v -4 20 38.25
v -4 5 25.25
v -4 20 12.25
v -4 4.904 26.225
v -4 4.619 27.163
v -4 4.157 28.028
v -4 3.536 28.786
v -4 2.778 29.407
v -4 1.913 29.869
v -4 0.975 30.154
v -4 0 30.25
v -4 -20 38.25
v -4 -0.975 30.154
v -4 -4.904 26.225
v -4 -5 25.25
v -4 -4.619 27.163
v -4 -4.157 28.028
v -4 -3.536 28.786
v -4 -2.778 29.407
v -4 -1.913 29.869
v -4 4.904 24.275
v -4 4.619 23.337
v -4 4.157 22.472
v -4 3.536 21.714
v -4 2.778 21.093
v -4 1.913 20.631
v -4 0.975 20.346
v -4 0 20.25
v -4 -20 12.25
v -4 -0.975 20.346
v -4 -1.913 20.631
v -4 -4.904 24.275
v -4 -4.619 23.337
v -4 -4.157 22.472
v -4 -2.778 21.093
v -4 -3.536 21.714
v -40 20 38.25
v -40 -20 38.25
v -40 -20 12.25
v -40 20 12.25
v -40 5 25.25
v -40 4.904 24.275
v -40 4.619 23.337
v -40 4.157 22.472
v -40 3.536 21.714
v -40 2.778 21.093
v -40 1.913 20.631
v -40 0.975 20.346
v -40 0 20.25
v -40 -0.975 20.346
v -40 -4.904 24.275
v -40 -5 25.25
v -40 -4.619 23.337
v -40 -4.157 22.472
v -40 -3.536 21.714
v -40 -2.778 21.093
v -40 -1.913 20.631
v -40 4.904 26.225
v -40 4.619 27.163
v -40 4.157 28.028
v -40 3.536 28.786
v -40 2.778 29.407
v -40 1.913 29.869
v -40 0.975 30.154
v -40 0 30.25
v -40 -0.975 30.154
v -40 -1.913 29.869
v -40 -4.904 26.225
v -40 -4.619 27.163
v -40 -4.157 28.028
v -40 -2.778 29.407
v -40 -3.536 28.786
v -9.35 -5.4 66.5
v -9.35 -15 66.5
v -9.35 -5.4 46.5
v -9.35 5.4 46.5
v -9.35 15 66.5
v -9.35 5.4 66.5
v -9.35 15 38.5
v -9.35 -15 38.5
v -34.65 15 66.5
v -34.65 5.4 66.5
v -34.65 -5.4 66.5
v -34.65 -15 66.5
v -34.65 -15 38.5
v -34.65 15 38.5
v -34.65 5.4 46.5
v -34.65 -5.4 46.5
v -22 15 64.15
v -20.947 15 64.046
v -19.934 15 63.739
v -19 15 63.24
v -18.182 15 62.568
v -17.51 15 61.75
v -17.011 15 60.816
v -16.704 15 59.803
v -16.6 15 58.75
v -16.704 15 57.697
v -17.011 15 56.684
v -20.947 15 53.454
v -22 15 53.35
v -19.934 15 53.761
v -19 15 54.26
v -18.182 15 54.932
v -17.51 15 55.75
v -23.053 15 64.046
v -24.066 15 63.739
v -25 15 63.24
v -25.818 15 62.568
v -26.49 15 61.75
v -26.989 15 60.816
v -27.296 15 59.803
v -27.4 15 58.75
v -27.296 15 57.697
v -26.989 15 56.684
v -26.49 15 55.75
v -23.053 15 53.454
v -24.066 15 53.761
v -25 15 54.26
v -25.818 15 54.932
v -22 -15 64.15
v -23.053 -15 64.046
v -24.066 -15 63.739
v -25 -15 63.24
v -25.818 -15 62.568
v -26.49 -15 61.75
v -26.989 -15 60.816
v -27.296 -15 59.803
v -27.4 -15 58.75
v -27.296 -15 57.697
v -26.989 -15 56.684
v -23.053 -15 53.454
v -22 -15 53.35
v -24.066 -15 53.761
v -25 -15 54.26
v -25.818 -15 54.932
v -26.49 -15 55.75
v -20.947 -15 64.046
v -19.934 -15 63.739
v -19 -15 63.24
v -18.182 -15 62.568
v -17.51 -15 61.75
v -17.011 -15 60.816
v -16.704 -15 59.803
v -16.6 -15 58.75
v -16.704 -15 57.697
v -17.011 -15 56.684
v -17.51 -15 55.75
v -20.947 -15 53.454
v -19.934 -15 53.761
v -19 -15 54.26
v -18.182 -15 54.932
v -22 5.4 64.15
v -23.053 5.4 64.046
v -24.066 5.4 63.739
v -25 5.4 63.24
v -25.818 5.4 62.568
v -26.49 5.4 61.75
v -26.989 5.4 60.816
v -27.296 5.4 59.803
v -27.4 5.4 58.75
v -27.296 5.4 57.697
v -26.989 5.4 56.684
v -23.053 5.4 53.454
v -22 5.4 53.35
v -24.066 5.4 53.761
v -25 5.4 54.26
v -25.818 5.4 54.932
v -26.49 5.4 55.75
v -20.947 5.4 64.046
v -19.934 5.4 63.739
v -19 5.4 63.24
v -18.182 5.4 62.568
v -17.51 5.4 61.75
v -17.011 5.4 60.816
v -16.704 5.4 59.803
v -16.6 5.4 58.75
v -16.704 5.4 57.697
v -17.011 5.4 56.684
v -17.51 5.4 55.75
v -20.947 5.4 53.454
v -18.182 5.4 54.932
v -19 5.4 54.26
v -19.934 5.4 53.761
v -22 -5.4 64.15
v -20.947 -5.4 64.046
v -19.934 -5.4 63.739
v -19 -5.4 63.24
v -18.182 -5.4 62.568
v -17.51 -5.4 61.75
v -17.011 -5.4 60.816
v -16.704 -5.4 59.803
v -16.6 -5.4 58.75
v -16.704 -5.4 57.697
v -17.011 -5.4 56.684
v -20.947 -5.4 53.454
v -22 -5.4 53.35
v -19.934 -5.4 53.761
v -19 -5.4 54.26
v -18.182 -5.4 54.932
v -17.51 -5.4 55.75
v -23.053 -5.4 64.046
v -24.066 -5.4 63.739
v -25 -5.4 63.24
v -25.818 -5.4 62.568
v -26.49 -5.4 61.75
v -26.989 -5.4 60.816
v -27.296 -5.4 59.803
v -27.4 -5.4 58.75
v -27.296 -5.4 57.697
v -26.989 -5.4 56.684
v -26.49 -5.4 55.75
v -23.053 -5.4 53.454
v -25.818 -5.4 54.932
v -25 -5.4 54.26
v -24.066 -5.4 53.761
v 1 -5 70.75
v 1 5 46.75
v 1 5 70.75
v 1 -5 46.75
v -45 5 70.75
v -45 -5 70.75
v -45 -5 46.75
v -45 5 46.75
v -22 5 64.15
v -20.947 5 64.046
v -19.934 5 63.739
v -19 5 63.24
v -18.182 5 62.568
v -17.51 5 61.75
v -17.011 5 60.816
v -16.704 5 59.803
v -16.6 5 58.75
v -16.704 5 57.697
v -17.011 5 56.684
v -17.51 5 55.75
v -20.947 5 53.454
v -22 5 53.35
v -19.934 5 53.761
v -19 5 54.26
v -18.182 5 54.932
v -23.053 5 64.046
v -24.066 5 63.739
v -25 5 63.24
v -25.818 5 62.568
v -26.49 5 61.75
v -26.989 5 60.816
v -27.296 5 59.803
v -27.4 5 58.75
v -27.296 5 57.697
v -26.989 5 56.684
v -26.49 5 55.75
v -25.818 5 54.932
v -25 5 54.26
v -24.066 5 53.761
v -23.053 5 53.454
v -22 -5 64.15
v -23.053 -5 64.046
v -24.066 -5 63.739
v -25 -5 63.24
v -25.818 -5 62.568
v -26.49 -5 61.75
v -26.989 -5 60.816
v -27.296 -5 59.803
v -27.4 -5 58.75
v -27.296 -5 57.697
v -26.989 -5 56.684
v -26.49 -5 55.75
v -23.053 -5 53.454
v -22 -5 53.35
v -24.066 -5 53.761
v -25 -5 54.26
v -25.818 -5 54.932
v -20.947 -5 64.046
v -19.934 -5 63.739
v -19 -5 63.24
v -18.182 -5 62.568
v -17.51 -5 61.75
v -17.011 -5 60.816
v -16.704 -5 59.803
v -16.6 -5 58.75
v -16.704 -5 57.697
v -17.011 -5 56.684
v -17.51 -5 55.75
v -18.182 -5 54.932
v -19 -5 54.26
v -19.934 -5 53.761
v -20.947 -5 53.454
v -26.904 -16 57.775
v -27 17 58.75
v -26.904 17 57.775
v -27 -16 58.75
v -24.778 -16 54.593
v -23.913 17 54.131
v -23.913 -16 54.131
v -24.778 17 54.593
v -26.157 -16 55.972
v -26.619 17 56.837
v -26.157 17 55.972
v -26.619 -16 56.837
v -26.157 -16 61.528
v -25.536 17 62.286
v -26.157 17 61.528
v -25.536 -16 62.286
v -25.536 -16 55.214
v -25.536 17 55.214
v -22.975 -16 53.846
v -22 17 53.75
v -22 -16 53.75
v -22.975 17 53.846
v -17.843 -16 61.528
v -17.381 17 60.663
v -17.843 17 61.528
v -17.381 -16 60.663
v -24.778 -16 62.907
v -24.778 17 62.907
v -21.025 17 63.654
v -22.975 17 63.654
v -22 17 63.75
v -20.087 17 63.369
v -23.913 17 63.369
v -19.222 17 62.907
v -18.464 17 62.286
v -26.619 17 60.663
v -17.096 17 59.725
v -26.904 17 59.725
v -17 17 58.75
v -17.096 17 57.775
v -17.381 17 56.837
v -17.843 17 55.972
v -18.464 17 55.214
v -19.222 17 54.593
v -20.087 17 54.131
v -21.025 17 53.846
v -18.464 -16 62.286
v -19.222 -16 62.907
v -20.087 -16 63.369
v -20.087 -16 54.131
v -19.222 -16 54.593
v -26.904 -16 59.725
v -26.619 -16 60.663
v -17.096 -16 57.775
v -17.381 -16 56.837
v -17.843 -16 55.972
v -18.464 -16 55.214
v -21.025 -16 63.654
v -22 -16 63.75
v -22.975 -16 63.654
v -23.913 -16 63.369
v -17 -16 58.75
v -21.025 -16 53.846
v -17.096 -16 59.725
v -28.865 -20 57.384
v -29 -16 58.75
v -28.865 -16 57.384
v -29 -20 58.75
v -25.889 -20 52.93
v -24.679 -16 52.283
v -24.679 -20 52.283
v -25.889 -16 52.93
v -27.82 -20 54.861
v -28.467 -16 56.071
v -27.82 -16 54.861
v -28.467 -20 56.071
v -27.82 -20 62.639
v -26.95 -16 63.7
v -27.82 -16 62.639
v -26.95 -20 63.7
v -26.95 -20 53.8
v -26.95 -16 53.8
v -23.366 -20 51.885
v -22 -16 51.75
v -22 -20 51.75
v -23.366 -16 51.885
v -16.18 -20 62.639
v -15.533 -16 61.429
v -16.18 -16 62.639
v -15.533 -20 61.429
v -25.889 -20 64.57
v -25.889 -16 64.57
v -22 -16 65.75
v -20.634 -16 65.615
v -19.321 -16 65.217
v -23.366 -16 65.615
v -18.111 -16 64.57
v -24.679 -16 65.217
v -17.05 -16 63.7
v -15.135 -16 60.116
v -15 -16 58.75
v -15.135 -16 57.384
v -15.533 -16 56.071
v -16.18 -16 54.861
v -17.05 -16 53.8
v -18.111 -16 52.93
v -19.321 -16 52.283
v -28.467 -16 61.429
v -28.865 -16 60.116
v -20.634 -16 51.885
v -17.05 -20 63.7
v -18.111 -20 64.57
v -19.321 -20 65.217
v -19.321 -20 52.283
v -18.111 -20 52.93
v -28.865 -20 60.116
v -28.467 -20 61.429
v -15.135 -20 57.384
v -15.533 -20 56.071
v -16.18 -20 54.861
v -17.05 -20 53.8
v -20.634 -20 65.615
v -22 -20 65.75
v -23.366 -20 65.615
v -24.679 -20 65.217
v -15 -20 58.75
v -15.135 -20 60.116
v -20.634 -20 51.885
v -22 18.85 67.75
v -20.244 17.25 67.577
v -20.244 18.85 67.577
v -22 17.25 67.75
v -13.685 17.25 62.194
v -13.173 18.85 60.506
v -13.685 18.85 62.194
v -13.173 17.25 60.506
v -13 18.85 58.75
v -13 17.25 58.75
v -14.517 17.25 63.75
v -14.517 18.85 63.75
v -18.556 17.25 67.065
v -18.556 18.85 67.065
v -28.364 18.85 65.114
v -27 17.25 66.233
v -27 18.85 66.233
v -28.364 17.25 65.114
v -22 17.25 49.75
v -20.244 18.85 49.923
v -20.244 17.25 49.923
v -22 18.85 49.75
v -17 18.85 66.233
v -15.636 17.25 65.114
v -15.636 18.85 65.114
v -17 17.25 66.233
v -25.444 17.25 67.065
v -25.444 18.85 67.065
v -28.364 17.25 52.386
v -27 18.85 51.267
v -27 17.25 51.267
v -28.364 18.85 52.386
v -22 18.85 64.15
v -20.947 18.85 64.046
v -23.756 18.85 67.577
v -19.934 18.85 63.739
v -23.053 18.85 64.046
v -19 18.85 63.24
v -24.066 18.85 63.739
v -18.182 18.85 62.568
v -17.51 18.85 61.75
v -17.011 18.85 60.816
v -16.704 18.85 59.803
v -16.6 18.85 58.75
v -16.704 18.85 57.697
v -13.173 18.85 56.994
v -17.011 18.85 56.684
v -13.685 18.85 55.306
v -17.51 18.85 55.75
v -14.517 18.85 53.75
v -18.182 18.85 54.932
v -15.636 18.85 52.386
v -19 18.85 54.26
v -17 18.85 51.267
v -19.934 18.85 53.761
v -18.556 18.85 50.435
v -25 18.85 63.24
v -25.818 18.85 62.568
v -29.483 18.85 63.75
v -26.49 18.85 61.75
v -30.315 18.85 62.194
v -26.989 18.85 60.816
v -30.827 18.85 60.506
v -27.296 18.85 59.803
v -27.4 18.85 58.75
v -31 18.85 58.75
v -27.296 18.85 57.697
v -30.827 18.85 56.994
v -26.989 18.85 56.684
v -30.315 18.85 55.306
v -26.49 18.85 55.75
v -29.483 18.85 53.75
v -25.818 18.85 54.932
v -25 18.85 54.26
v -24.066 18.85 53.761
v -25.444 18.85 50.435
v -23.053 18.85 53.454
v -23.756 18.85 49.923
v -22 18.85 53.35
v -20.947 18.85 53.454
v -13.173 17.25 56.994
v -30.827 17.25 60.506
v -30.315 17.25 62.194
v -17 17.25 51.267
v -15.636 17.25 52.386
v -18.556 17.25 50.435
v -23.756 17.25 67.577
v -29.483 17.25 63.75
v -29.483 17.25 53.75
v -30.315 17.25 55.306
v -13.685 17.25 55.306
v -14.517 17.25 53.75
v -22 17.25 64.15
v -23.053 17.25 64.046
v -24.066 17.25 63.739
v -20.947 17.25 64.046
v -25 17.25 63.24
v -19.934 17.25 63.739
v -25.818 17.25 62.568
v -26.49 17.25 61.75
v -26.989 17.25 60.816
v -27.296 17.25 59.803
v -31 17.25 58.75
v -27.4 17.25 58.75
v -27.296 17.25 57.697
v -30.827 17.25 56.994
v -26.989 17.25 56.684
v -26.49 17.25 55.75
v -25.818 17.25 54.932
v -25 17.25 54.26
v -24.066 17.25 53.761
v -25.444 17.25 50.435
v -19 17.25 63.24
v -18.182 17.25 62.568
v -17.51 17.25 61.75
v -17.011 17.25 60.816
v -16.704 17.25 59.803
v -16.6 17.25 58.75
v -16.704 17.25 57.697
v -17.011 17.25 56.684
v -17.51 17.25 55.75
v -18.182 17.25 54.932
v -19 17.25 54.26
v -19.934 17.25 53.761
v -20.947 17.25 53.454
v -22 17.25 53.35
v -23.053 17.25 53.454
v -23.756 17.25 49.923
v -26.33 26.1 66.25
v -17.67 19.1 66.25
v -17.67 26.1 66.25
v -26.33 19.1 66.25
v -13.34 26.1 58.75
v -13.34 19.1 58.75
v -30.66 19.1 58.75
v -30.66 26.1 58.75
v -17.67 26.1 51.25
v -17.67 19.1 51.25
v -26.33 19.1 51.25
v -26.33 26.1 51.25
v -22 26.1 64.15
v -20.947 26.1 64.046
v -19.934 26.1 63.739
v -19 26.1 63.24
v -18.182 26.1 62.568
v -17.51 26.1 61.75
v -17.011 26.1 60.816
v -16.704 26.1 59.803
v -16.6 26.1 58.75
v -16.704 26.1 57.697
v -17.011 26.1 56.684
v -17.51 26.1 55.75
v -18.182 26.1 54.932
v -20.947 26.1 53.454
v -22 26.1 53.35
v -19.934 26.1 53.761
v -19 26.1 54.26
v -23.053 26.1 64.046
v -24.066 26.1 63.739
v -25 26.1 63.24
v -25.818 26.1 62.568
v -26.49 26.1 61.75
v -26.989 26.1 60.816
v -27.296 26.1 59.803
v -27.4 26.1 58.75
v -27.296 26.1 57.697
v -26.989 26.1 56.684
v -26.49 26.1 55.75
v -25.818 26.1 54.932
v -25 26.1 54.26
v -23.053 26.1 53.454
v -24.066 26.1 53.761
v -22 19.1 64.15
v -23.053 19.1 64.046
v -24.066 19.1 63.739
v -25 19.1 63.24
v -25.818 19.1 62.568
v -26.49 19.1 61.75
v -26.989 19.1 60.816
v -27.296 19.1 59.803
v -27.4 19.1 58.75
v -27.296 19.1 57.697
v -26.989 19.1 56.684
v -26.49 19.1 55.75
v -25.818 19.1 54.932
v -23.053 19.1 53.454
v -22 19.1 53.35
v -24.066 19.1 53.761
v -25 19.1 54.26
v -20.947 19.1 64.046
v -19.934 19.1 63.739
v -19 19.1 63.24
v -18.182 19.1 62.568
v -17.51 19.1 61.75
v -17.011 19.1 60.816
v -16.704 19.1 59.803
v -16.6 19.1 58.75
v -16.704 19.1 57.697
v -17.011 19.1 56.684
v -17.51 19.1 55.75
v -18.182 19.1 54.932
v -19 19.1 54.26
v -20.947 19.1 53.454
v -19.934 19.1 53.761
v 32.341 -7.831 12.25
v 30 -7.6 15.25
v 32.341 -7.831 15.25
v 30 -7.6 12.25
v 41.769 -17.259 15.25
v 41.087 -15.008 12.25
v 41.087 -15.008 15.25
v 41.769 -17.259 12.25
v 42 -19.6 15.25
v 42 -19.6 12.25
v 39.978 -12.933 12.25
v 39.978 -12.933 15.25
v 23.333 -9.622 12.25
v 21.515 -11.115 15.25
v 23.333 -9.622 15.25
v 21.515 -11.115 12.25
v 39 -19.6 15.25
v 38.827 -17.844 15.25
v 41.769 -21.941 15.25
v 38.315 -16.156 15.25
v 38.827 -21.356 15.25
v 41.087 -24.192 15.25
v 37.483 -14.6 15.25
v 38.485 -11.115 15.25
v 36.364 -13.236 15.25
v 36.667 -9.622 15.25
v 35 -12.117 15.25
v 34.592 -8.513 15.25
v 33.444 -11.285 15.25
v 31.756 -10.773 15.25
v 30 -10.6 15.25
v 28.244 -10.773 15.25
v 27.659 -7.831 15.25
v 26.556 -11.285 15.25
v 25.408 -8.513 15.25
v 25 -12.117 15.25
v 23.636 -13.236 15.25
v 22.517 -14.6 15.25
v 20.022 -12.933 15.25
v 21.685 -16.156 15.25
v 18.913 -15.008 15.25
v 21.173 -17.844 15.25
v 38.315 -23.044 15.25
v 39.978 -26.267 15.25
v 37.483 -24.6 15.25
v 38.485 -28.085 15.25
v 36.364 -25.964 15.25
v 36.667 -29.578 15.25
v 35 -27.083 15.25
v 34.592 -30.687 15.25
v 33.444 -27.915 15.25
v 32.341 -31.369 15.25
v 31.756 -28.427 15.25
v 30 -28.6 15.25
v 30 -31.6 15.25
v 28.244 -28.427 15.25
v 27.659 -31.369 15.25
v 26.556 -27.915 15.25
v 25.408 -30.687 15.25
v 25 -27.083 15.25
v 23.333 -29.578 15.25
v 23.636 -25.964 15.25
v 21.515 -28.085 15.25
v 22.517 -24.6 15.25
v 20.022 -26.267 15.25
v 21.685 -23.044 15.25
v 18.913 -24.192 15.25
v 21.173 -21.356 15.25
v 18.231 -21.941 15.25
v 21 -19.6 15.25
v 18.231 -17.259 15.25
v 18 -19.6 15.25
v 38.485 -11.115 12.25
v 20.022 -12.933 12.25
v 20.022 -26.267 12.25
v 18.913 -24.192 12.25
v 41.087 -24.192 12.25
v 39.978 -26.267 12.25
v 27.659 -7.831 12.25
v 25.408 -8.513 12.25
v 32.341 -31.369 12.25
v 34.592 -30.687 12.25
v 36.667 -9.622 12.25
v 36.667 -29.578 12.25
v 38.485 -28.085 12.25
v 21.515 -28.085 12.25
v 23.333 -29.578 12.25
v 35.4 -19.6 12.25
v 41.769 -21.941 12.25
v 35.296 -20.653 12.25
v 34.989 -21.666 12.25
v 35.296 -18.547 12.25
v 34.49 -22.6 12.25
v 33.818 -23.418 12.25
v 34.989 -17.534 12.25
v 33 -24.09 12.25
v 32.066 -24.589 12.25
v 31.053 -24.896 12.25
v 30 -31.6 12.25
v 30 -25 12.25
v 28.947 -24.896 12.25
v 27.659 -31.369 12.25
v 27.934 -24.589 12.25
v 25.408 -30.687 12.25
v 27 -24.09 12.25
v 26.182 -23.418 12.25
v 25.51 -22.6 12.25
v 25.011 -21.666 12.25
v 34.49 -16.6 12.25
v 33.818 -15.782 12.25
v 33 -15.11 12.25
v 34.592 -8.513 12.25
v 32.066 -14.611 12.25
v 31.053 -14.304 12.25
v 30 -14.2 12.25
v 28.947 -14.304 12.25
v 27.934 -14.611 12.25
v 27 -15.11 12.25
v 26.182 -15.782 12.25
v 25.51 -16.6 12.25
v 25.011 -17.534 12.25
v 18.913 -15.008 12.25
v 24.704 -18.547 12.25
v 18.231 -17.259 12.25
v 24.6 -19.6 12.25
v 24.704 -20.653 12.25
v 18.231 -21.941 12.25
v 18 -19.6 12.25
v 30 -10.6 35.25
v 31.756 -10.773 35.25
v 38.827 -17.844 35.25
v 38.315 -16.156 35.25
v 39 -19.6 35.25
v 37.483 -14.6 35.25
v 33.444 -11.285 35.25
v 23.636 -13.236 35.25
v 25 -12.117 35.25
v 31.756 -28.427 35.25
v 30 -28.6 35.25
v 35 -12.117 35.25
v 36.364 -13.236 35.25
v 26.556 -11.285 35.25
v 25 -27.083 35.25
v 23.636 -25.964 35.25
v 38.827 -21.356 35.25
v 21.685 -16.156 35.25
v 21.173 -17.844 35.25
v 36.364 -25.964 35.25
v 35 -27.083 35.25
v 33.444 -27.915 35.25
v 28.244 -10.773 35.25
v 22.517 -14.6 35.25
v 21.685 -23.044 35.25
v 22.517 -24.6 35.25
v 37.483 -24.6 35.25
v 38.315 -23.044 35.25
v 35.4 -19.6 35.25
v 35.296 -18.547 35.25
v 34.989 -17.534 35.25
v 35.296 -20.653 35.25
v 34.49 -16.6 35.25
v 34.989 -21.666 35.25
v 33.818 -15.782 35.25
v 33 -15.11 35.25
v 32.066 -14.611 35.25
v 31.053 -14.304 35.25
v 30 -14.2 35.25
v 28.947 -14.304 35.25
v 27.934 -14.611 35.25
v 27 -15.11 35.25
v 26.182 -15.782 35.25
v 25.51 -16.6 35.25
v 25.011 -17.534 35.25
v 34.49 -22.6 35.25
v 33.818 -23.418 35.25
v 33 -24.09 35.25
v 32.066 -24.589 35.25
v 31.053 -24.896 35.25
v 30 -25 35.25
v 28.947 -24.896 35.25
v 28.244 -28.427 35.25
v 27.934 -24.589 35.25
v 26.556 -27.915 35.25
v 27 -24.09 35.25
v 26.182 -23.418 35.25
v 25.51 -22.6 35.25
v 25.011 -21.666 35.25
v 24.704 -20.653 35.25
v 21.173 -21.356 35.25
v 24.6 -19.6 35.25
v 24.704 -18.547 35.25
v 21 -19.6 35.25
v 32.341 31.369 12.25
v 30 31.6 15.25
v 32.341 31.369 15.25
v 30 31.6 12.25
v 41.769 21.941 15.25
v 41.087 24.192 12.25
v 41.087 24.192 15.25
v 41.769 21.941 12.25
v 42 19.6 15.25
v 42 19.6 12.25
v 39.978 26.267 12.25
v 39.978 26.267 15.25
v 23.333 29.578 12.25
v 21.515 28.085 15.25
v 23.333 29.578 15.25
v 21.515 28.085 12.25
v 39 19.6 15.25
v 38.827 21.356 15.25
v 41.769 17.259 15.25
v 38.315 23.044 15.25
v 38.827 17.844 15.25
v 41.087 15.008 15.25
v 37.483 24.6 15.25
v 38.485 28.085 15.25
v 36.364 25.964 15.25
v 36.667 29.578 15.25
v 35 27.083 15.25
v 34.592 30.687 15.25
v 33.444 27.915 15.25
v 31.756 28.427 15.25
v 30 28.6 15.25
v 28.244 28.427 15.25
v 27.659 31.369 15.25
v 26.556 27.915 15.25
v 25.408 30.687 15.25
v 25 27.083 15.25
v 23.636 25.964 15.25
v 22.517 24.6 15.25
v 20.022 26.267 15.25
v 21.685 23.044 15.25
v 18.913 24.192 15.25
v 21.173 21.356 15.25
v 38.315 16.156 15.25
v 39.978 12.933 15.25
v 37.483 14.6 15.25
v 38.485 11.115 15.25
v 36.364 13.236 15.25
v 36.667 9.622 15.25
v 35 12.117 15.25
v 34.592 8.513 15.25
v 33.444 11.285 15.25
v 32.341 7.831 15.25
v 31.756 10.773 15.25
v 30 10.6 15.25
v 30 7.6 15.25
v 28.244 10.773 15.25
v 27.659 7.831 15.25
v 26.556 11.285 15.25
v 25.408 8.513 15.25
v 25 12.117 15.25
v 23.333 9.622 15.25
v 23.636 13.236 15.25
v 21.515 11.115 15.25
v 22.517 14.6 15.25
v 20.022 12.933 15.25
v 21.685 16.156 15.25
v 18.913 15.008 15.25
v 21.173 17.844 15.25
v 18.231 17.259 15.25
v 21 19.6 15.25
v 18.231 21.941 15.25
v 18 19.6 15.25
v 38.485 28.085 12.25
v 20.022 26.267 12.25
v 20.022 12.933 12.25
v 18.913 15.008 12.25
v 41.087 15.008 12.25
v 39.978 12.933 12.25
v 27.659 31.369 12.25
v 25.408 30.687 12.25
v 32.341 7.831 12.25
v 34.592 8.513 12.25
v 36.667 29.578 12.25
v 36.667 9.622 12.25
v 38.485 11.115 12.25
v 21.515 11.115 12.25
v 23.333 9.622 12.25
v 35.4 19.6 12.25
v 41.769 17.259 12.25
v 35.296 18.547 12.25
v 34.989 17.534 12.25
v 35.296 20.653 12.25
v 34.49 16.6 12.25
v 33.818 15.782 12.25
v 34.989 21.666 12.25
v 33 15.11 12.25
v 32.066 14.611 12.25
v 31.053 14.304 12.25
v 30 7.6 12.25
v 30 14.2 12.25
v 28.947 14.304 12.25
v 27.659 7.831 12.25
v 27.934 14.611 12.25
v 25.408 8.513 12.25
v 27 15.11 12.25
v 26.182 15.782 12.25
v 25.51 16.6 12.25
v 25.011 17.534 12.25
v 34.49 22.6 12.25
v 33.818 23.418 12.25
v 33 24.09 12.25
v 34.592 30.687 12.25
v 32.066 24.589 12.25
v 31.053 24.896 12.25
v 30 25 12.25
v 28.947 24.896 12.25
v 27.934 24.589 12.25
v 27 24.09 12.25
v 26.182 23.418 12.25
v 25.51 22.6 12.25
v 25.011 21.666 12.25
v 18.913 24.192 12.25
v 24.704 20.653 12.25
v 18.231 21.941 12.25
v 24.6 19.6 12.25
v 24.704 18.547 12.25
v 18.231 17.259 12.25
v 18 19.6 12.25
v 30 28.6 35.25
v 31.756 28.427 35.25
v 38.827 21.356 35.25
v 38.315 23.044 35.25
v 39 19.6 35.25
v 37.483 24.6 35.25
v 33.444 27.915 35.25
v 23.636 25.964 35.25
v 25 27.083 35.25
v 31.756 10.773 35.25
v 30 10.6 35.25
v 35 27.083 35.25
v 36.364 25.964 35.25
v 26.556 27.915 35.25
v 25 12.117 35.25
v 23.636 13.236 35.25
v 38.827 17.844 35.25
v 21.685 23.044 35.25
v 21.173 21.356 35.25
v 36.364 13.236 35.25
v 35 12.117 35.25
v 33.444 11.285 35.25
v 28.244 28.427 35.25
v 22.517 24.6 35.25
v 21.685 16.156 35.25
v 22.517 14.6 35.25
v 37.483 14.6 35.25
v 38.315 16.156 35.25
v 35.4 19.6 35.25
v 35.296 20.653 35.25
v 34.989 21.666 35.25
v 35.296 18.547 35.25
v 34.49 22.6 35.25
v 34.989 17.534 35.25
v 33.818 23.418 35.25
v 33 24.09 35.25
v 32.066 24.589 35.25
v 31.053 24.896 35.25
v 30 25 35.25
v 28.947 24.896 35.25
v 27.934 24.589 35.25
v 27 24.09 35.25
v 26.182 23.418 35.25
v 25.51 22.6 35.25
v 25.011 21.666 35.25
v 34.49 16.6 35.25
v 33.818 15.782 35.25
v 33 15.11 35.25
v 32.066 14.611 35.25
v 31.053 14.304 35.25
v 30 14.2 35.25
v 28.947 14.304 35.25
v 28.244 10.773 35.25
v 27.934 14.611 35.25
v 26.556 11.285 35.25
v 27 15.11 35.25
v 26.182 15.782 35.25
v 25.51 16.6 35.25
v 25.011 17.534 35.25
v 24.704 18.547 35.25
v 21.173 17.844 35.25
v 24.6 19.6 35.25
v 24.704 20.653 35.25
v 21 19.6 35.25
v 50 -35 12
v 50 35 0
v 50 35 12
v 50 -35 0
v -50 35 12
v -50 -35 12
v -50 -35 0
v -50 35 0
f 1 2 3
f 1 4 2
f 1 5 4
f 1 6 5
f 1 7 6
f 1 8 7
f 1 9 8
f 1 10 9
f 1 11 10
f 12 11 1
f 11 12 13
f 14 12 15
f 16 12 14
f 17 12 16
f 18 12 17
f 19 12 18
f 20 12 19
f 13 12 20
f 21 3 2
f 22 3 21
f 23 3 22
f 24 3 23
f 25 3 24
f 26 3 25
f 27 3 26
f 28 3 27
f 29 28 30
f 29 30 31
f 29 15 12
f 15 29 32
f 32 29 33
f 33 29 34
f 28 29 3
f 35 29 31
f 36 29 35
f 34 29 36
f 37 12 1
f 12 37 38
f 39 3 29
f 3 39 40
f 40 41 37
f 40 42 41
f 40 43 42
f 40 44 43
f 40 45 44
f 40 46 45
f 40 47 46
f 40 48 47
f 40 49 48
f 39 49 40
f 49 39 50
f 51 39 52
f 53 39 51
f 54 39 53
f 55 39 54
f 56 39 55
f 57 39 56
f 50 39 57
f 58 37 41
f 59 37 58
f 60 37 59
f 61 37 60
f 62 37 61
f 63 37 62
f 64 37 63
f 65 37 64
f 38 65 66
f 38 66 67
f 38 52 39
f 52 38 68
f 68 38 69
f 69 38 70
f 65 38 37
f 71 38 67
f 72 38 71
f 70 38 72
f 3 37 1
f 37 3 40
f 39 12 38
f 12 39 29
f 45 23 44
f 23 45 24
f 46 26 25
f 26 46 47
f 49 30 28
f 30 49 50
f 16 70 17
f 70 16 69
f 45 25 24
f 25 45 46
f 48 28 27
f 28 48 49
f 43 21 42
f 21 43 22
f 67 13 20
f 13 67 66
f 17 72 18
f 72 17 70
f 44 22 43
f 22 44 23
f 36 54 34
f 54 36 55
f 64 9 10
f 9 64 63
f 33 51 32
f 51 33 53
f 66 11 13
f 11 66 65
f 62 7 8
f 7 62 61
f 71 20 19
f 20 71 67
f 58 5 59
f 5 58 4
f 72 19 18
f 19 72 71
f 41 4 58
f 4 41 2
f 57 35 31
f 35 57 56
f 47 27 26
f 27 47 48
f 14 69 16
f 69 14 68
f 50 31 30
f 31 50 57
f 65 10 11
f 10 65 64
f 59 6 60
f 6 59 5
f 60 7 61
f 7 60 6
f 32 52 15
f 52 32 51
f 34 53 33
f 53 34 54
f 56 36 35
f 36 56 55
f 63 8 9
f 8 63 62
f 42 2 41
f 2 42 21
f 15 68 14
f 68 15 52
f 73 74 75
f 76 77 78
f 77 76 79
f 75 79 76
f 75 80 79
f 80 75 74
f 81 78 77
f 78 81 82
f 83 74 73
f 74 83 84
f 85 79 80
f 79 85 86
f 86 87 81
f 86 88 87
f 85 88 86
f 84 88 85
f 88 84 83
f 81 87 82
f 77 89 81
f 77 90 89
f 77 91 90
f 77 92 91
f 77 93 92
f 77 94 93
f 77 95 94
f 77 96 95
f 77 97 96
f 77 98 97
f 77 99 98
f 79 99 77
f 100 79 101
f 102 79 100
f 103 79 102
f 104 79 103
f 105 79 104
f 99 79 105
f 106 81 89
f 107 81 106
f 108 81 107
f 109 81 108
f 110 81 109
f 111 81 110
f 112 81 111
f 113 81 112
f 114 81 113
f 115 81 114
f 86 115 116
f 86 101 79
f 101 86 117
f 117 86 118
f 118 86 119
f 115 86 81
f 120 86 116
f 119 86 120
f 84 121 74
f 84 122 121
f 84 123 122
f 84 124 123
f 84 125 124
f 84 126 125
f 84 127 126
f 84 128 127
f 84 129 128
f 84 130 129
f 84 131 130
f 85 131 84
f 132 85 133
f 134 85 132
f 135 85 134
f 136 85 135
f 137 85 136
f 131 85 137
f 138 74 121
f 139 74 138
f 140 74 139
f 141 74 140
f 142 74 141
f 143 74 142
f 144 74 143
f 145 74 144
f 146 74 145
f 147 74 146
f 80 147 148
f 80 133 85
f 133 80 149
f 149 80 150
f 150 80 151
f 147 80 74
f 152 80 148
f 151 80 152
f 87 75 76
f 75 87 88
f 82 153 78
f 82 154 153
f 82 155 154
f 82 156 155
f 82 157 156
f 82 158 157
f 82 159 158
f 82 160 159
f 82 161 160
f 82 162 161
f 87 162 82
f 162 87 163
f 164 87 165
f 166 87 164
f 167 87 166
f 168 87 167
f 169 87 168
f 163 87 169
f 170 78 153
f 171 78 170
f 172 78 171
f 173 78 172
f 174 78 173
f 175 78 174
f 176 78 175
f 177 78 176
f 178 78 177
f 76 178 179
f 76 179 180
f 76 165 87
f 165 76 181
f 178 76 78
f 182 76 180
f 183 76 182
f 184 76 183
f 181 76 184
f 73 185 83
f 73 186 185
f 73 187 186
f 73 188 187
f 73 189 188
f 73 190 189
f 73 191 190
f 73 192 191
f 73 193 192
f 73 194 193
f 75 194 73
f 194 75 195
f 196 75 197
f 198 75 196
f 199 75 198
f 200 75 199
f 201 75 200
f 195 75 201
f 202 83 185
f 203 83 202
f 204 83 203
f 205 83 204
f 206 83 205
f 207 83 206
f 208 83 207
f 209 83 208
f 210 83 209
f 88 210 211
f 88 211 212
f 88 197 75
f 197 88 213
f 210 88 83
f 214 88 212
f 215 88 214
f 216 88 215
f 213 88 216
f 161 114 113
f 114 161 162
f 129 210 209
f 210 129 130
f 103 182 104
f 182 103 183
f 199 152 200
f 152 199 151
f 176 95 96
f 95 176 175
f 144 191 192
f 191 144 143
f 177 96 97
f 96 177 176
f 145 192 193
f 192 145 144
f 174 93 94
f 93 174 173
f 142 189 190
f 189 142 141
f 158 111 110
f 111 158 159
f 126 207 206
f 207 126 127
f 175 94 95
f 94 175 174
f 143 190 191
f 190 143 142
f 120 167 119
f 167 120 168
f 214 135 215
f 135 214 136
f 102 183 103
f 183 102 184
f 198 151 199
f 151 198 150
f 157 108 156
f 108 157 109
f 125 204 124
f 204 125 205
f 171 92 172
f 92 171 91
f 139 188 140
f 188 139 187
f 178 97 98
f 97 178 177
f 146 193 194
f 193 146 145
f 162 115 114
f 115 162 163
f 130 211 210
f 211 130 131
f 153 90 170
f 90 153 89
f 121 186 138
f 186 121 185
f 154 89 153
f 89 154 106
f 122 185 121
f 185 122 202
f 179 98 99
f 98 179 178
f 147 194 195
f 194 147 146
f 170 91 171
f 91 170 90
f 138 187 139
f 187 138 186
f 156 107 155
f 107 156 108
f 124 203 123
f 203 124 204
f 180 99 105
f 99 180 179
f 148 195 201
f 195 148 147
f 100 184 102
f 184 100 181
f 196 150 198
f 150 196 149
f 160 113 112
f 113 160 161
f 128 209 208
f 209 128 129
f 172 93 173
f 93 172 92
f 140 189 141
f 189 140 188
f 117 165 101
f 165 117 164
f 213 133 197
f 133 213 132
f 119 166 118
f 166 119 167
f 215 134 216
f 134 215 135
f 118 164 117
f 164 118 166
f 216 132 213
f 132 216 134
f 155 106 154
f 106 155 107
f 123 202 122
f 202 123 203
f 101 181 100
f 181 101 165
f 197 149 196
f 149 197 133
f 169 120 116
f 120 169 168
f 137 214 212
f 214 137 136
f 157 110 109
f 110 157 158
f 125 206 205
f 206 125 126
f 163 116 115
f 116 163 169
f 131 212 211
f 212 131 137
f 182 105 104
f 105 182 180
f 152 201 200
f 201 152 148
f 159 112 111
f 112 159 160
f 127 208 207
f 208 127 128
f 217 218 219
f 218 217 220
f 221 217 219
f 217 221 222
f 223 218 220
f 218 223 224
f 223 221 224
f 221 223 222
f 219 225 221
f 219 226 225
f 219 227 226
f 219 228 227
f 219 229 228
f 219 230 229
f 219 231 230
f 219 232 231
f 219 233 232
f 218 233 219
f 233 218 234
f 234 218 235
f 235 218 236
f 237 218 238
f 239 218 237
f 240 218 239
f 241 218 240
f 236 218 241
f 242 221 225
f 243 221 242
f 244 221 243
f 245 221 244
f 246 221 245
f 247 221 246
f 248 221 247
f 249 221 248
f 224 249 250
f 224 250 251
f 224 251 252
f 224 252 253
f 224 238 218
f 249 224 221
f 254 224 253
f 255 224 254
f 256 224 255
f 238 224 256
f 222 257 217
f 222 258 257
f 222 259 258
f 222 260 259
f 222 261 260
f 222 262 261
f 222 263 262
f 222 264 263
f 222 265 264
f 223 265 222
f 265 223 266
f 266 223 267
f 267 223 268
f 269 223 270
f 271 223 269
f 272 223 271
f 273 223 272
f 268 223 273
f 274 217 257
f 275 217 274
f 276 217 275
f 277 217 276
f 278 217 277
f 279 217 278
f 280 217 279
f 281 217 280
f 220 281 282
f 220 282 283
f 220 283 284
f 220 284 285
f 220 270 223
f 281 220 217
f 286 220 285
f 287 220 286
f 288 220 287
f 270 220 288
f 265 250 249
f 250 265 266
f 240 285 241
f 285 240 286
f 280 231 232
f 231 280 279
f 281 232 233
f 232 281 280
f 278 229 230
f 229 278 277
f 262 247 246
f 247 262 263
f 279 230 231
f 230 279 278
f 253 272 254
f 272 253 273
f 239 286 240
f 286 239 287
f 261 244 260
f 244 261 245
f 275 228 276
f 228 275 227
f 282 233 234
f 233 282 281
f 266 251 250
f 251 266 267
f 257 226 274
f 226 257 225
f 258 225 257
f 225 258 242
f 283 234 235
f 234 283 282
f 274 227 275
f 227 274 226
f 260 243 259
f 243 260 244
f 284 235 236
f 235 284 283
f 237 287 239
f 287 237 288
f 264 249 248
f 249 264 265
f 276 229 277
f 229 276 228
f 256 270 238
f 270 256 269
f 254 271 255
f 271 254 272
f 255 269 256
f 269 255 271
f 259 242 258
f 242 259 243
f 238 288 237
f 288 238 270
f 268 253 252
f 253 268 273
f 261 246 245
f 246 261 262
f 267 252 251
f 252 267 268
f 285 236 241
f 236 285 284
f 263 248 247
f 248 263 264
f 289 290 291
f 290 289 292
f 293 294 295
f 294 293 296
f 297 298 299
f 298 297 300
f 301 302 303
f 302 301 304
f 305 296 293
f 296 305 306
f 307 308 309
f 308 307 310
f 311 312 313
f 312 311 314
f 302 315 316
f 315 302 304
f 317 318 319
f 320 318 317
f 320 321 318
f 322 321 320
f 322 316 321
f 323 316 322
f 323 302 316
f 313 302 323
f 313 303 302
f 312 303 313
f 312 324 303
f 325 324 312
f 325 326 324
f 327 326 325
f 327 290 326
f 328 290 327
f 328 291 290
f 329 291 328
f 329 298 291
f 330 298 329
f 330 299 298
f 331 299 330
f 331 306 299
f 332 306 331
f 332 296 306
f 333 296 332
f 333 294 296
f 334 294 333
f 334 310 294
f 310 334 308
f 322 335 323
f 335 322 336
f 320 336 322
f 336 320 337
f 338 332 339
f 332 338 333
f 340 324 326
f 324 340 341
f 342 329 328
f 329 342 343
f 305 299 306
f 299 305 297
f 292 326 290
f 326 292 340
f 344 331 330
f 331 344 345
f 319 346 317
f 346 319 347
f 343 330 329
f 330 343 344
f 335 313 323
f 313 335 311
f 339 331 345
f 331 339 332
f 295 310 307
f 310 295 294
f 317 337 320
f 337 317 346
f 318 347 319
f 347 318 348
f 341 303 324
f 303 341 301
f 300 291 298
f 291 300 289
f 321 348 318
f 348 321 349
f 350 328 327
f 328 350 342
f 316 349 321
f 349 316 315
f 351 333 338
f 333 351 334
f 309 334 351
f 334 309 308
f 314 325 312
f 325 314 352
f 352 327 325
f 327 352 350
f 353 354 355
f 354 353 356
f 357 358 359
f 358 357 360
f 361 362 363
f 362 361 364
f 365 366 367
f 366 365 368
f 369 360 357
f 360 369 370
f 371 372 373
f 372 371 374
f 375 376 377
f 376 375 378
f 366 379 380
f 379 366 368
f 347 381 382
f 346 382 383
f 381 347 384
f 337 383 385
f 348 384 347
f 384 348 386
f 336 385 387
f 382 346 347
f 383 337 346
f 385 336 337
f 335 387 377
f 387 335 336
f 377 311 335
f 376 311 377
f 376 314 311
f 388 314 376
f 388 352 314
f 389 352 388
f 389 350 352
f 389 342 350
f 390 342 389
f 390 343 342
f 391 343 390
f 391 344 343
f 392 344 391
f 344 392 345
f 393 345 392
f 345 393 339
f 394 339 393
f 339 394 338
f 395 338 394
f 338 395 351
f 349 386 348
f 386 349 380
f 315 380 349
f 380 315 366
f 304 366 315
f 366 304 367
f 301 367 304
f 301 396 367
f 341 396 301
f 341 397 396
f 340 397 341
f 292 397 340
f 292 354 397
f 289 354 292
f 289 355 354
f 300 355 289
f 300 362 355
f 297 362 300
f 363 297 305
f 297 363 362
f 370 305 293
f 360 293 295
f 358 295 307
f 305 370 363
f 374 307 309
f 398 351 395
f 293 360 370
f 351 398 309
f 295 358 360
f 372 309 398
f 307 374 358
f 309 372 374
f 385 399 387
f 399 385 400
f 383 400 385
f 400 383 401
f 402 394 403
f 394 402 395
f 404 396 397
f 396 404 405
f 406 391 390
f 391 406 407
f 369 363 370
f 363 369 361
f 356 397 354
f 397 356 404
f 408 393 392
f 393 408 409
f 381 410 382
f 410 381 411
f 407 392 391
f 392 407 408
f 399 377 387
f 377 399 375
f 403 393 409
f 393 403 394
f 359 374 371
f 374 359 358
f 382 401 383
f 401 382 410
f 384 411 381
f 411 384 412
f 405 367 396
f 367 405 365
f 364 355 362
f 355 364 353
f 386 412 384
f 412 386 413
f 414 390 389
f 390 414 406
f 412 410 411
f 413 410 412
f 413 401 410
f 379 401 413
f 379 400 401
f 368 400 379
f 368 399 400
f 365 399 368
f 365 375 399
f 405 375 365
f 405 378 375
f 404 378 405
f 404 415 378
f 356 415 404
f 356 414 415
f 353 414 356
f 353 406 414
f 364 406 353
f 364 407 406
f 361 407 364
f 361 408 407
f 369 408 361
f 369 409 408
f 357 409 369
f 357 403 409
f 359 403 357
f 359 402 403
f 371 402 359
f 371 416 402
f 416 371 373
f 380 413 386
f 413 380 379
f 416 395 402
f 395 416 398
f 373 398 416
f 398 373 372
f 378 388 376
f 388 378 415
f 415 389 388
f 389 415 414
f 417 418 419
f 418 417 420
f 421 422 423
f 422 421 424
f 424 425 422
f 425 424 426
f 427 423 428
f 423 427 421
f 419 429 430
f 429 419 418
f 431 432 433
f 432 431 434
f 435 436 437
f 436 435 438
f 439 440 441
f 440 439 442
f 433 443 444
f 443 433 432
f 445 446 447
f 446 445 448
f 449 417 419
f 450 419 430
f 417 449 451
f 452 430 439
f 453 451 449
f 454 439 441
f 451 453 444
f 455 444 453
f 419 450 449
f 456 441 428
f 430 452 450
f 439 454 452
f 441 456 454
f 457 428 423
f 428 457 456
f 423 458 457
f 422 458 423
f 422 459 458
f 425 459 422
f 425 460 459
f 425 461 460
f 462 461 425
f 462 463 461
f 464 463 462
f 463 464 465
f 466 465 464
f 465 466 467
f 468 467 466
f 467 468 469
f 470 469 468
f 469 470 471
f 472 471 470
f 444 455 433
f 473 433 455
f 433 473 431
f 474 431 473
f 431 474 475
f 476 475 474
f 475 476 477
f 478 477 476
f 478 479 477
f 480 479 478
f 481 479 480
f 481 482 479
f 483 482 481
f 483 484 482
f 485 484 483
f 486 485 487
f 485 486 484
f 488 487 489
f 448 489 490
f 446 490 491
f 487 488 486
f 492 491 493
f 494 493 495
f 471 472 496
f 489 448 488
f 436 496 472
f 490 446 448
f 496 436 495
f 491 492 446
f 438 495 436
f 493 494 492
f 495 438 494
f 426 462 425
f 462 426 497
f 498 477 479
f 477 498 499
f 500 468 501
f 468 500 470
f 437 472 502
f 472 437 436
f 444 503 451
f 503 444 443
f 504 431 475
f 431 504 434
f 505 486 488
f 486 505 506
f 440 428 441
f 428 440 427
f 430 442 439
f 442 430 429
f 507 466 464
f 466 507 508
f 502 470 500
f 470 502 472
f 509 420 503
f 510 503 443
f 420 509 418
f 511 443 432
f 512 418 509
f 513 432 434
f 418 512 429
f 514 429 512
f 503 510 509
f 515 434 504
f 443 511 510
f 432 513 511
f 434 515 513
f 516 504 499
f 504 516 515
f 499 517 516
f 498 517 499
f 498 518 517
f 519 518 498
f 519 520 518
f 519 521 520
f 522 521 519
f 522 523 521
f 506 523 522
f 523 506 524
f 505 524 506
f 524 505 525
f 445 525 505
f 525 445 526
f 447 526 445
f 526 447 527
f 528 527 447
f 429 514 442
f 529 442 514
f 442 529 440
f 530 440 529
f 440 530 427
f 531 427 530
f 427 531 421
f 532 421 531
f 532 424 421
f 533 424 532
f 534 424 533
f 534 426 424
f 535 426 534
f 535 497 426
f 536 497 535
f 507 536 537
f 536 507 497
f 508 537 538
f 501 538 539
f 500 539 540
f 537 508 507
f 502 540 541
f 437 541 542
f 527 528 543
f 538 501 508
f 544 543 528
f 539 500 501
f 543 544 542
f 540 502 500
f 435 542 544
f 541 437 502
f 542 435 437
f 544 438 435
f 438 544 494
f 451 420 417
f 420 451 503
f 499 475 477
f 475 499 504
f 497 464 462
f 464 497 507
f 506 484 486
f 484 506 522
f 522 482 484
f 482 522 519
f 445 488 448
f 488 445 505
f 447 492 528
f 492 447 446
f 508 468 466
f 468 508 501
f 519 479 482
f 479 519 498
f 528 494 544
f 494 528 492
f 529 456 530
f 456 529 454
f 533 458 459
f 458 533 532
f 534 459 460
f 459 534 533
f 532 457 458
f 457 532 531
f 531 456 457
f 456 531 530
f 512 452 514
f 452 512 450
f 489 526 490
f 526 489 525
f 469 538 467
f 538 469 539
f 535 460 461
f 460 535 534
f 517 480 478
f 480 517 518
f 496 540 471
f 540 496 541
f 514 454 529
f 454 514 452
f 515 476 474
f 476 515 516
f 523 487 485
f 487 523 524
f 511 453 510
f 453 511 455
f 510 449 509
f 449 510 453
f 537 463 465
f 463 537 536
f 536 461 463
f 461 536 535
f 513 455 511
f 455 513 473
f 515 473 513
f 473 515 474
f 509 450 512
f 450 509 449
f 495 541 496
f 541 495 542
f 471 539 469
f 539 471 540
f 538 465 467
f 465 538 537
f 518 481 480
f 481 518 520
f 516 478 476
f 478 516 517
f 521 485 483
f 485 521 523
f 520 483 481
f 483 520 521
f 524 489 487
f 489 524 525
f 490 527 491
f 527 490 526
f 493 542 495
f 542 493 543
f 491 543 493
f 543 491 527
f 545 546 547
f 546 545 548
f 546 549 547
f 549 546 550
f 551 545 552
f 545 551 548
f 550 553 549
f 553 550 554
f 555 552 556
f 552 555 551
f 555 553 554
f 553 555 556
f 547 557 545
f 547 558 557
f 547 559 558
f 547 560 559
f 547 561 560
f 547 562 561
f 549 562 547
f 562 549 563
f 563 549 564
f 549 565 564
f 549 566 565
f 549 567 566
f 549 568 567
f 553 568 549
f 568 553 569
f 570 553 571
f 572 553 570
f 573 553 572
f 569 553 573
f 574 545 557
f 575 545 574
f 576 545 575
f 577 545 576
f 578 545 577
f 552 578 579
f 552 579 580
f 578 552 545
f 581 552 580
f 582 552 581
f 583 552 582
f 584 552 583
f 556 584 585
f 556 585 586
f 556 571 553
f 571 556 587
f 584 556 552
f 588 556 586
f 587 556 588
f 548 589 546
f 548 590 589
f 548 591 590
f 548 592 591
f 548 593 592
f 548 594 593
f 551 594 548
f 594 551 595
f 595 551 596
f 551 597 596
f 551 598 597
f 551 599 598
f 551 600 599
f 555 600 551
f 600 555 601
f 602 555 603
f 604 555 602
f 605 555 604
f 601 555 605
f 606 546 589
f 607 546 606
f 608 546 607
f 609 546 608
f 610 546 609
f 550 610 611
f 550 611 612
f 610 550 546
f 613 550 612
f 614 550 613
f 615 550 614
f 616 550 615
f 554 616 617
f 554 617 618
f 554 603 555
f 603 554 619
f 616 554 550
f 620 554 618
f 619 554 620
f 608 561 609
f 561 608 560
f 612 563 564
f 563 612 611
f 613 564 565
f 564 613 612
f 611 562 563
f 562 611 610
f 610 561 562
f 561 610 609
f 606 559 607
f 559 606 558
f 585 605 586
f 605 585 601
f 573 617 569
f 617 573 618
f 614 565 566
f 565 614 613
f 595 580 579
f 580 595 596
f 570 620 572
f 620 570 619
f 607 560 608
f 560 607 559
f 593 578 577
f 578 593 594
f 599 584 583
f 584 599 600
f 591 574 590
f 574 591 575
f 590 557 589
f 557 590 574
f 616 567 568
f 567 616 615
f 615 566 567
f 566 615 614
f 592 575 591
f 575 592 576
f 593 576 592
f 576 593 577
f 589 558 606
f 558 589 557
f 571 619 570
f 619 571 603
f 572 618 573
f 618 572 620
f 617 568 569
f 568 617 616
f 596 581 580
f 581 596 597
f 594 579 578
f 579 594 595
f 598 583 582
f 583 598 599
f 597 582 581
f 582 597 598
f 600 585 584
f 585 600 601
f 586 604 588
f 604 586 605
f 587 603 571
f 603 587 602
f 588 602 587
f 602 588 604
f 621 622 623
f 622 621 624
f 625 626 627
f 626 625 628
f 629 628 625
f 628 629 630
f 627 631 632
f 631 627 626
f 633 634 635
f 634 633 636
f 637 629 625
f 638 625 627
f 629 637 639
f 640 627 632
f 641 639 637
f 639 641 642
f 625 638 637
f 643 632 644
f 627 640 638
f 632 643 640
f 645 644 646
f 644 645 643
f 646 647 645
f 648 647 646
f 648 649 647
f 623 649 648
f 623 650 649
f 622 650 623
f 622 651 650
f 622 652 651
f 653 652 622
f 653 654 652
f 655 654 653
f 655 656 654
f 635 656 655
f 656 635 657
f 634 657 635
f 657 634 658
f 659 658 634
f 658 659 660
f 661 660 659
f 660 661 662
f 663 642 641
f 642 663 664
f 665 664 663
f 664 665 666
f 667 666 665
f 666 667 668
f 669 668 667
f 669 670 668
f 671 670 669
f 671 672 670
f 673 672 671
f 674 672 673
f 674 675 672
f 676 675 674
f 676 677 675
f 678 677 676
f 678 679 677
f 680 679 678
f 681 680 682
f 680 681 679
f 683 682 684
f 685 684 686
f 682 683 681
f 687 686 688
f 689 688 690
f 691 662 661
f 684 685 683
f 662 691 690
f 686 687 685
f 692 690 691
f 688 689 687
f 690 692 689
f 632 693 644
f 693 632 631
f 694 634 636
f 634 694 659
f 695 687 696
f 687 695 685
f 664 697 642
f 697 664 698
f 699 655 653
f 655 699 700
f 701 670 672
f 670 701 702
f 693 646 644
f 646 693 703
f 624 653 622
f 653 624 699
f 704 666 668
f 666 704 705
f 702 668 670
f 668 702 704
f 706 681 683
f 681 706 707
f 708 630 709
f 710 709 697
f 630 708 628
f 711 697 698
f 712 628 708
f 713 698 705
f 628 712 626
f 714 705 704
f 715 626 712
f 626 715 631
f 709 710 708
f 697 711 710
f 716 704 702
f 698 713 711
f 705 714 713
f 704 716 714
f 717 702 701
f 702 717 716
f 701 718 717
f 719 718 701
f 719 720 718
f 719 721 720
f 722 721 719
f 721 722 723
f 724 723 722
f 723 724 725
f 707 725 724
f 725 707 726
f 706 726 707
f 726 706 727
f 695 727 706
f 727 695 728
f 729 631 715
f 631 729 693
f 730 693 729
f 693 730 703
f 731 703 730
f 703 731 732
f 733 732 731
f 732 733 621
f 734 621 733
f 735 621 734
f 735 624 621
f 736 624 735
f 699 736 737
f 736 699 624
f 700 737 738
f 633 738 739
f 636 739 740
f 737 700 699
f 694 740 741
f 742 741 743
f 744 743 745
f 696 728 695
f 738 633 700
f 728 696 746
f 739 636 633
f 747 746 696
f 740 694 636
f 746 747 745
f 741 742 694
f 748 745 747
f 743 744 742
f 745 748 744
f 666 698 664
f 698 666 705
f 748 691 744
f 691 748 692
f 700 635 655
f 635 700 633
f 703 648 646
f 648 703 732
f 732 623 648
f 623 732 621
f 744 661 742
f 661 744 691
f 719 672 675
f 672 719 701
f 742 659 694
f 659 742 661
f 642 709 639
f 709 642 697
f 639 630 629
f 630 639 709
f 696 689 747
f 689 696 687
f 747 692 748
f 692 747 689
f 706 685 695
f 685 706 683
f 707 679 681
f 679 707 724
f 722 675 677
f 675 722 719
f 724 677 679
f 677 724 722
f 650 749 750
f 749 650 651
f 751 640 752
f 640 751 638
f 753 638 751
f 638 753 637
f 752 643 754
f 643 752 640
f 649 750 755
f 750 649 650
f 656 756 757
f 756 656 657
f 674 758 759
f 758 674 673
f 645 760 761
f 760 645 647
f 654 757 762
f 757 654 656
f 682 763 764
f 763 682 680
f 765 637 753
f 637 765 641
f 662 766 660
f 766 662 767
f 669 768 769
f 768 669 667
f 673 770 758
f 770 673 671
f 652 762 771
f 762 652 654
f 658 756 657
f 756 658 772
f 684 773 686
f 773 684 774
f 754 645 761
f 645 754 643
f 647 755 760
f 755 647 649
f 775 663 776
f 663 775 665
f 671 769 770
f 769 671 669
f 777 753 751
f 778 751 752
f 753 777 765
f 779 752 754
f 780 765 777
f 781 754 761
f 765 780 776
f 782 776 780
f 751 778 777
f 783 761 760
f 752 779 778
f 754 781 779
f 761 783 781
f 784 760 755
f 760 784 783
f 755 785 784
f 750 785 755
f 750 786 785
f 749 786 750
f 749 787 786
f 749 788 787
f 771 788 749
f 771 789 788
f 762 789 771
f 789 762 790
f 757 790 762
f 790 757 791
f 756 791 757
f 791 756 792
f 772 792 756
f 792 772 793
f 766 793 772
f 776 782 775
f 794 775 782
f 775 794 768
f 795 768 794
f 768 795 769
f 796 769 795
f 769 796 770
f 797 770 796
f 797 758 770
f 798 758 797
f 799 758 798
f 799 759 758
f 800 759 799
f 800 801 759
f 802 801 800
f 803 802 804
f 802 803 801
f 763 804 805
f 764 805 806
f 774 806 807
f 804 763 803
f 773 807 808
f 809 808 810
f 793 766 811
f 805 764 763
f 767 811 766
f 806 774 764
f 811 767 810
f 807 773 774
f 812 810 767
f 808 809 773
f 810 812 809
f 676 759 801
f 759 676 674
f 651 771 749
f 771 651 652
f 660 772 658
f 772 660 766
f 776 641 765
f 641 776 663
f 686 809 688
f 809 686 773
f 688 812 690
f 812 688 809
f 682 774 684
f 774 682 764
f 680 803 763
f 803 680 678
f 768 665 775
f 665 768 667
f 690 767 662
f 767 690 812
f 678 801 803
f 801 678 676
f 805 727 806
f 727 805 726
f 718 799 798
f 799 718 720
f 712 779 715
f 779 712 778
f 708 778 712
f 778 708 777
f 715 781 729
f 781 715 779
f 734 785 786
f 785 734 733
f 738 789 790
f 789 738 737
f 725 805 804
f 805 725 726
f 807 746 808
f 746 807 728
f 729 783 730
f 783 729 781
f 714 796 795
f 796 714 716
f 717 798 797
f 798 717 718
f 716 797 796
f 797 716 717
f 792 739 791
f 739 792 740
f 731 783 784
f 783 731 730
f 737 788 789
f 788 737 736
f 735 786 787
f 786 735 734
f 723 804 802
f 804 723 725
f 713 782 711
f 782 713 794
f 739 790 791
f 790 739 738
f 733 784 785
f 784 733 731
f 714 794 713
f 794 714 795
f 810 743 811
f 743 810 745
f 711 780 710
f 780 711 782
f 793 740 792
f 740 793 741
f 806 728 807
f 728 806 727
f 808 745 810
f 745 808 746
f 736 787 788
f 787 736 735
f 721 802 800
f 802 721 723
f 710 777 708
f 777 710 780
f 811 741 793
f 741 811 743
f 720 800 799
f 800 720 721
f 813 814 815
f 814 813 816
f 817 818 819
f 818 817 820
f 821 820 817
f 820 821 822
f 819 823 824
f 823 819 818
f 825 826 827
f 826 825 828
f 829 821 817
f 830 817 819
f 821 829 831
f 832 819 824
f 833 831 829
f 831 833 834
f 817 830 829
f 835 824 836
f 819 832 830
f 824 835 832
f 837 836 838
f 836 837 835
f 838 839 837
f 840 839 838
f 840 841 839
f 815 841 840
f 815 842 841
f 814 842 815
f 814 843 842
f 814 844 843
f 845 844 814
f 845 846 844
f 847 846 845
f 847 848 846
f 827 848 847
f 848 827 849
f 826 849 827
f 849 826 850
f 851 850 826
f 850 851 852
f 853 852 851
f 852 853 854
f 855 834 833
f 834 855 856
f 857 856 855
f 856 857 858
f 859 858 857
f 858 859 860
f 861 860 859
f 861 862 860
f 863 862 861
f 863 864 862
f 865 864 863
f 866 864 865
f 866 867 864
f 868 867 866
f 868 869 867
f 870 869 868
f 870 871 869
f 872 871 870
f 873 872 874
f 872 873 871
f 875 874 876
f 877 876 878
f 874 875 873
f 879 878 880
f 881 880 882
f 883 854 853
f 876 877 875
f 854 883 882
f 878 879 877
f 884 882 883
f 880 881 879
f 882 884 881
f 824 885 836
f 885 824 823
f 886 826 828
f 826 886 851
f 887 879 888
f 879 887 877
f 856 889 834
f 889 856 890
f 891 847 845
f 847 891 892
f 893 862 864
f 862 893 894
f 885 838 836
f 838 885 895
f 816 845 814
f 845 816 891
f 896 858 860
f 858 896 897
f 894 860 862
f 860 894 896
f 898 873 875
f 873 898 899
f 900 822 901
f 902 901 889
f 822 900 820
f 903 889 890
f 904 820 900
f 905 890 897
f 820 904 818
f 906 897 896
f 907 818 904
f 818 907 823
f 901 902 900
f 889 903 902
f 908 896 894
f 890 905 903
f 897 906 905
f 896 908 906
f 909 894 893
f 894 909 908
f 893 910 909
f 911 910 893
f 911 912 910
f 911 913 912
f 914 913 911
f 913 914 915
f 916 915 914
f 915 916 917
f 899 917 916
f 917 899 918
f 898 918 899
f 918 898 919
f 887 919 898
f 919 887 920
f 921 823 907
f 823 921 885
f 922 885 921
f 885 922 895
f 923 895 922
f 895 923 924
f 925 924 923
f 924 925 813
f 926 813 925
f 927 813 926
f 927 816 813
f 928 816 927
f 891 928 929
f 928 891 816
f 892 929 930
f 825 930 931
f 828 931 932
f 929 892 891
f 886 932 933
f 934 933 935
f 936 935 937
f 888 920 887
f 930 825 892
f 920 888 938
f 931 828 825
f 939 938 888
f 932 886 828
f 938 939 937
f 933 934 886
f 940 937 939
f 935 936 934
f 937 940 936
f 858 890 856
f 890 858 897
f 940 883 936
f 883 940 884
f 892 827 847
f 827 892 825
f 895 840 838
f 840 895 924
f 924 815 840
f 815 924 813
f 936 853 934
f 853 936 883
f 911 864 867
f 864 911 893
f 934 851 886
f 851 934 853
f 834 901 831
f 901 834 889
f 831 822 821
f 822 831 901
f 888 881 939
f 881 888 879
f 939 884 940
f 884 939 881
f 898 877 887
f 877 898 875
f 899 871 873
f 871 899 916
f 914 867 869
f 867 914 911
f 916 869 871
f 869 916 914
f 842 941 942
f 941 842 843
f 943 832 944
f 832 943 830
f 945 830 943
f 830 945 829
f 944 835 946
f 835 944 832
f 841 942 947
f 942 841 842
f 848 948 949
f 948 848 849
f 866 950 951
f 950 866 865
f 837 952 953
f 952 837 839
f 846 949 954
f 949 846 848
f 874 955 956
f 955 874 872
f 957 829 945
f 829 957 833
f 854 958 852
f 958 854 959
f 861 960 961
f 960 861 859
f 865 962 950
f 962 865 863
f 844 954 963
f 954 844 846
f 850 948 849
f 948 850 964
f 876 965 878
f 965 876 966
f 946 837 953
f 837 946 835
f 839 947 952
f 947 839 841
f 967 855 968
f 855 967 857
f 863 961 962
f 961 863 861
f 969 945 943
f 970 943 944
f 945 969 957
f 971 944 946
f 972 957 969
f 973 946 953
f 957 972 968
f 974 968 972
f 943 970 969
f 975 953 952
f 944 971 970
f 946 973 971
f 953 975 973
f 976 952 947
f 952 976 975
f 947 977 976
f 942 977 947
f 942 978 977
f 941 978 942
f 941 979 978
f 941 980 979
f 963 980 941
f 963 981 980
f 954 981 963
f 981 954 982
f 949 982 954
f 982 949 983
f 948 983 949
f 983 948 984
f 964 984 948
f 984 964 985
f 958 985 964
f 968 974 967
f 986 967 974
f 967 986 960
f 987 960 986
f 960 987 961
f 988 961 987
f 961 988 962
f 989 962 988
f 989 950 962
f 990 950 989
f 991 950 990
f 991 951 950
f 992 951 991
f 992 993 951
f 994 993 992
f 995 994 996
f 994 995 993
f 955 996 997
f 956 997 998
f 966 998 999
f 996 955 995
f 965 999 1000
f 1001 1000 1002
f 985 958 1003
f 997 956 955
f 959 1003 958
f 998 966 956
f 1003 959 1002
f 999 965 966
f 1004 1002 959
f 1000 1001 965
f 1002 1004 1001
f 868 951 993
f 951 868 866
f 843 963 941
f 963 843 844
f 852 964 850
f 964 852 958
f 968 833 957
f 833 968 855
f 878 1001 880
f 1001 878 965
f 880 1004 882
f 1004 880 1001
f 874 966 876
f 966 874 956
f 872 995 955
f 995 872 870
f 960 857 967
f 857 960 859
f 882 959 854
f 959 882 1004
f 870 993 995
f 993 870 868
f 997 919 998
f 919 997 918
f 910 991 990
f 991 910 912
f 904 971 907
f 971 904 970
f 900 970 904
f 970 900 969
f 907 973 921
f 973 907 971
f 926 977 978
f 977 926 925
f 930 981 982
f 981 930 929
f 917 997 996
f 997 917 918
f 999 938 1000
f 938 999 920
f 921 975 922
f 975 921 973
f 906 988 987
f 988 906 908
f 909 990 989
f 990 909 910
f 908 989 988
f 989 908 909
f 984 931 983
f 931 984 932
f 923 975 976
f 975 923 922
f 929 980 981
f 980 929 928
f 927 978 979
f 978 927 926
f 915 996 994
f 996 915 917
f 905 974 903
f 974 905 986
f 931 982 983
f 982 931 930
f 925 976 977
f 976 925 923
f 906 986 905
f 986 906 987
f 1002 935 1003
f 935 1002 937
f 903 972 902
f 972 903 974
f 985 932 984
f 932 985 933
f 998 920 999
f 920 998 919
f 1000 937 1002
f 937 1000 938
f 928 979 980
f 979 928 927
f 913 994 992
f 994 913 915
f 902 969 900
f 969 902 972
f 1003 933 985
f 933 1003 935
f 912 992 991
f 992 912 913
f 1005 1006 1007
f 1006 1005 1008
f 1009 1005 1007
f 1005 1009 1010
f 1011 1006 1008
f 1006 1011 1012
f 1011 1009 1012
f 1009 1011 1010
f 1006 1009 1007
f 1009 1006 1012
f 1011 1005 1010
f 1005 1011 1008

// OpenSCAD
$fn = 32;

// ------------------------------------------------------------------------
// Indexing jig: plate 100 x 70 mm, pin d10
// Every part is its own module, assembly() places every instance.
// ------------------------------------------------------------------------

// --- part 1 ---
module jig_plate() {
  difference() {
    translate([-50, -35, 0]) cube([100, 70, 12]);
  }
}

// --- part 2 ---
module locator_block() {
  difference() {
    translate([-18, -20, 0]) cube([36, 40, 26]);
    translate([0, 0, 13]) rotate([0, 90, 0]) cylinder(h = 38, d = 10, center = true);
  }
}

// --- part 3 ---
module index_fork() {
  difference() {
    translate([-12.65, -15, 0]) cube([25.3, 30, 28]);
    translate([-13.65, -5.4, 8]) cube([27.3, 10.8, 21]);
    translate([0, 0, 20.25]) rotate([90, 0, 0]) cylinder(h = 32, d = 10.8, center = true);
  }
}

// --- part 4 ---
module index_arm() {
  difference() {
    translate([-23, -5, 0]) cube([46, 10, 24]);
    translate([0, 0, 12]) rotate([90, 0, 0]) cylinder(h = 12, d = 10.8, center = true);
  }
}

// --- part 5 ---
module index_pin() {
  rotate([0, 90, 0]) cylinder(h = 34, d = 10, center = true);
  translate([-20, 0, 0]) rotate([0, 90, 0]) cylinder(h = 4, d = 14);
}

// --- part 6 ---
module pin_washer() {
  difference() {
      translate([0, 0, 0]) cylinder(h = 1.6, d = 18);
      translate([0, 0, -1]) cylinder(h = 3.6, d = 10.8);
    }
}

// --- part 7 ---
module lock_nut() {
  difference() {
    linear_extrude(height = 7) polygon(points = [[8.66, 0], [4.33, 7.5], [-4.33, 7.5], [-8.66, 0], [-4.33, -7.5], [4.33, -7.5]]);
    translate([0, 0, -1]) cylinder(h = 9, d = 10.8);
  }
}

// --- part 8 ---
module guide_bush_a() {
  difference() {
    union() {
      cylinder(h = 3, d = 24);
      translate([0, 0, 3]) cylinder(h = 20, d = 18);
    }
    translate([0, 0, -1]) cylinder(h = 25, d = 10.8);
  }
}

// --- part 9 ---
module guide_bush_b() {
  difference() {
    union() {
      cylinder(h = 3, d = 24);
      translate([0, 0, 3]) cylinder(h = 20, d = 18);
    }
    translate([0, 0, -1]) cylinder(h = 25, d = 10.8);
  }
}

// --- assembly ---
module assembly() {
  color([0.80, 0.24, 0.20]) translate([0, 0, 0]) rotate([0, 0, 0]) jig_plate();
  color([0.20, 0.45, 0.75]) translate([-22, 0, 12.25]) rotate([0, 0, 0]) locator_block();
  color([0.25, 0.62, 0.32]) translate([-22, 0, 38.5]) rotate([0, 0, 0]) index_fork();
  color([0.92, 0.70, 0.18]) translate([-22, 0, 46.75]) rotate([0, 0, 0]) index_arm();
  color([0.58, 0.35, 0.70]) translate([-22, 0, 58.75]) rotate([0, 0, 90]) index_pin();
  color([0.16, 0.66, 0.66]) translate([-22, 18.85, 58.75]) rotate([90, 0, 0]) pin_washer();
  color([0.85, 0.48, 0.18]) translate([-22, 26.1, 58.75]) rotate([90, 0, 0]) lock_nut();
  color([0.55, 0.60, 0.65]) translate([30, -19.6, 12.25]) rotate([0, 0, 0]) guide_bush_a();
  color([0.75, 0.30, 0.55]) translate([30, 19.6, 12.25]) rotate([0, 0, 0]) guide_bush_b();
}

assembly();
